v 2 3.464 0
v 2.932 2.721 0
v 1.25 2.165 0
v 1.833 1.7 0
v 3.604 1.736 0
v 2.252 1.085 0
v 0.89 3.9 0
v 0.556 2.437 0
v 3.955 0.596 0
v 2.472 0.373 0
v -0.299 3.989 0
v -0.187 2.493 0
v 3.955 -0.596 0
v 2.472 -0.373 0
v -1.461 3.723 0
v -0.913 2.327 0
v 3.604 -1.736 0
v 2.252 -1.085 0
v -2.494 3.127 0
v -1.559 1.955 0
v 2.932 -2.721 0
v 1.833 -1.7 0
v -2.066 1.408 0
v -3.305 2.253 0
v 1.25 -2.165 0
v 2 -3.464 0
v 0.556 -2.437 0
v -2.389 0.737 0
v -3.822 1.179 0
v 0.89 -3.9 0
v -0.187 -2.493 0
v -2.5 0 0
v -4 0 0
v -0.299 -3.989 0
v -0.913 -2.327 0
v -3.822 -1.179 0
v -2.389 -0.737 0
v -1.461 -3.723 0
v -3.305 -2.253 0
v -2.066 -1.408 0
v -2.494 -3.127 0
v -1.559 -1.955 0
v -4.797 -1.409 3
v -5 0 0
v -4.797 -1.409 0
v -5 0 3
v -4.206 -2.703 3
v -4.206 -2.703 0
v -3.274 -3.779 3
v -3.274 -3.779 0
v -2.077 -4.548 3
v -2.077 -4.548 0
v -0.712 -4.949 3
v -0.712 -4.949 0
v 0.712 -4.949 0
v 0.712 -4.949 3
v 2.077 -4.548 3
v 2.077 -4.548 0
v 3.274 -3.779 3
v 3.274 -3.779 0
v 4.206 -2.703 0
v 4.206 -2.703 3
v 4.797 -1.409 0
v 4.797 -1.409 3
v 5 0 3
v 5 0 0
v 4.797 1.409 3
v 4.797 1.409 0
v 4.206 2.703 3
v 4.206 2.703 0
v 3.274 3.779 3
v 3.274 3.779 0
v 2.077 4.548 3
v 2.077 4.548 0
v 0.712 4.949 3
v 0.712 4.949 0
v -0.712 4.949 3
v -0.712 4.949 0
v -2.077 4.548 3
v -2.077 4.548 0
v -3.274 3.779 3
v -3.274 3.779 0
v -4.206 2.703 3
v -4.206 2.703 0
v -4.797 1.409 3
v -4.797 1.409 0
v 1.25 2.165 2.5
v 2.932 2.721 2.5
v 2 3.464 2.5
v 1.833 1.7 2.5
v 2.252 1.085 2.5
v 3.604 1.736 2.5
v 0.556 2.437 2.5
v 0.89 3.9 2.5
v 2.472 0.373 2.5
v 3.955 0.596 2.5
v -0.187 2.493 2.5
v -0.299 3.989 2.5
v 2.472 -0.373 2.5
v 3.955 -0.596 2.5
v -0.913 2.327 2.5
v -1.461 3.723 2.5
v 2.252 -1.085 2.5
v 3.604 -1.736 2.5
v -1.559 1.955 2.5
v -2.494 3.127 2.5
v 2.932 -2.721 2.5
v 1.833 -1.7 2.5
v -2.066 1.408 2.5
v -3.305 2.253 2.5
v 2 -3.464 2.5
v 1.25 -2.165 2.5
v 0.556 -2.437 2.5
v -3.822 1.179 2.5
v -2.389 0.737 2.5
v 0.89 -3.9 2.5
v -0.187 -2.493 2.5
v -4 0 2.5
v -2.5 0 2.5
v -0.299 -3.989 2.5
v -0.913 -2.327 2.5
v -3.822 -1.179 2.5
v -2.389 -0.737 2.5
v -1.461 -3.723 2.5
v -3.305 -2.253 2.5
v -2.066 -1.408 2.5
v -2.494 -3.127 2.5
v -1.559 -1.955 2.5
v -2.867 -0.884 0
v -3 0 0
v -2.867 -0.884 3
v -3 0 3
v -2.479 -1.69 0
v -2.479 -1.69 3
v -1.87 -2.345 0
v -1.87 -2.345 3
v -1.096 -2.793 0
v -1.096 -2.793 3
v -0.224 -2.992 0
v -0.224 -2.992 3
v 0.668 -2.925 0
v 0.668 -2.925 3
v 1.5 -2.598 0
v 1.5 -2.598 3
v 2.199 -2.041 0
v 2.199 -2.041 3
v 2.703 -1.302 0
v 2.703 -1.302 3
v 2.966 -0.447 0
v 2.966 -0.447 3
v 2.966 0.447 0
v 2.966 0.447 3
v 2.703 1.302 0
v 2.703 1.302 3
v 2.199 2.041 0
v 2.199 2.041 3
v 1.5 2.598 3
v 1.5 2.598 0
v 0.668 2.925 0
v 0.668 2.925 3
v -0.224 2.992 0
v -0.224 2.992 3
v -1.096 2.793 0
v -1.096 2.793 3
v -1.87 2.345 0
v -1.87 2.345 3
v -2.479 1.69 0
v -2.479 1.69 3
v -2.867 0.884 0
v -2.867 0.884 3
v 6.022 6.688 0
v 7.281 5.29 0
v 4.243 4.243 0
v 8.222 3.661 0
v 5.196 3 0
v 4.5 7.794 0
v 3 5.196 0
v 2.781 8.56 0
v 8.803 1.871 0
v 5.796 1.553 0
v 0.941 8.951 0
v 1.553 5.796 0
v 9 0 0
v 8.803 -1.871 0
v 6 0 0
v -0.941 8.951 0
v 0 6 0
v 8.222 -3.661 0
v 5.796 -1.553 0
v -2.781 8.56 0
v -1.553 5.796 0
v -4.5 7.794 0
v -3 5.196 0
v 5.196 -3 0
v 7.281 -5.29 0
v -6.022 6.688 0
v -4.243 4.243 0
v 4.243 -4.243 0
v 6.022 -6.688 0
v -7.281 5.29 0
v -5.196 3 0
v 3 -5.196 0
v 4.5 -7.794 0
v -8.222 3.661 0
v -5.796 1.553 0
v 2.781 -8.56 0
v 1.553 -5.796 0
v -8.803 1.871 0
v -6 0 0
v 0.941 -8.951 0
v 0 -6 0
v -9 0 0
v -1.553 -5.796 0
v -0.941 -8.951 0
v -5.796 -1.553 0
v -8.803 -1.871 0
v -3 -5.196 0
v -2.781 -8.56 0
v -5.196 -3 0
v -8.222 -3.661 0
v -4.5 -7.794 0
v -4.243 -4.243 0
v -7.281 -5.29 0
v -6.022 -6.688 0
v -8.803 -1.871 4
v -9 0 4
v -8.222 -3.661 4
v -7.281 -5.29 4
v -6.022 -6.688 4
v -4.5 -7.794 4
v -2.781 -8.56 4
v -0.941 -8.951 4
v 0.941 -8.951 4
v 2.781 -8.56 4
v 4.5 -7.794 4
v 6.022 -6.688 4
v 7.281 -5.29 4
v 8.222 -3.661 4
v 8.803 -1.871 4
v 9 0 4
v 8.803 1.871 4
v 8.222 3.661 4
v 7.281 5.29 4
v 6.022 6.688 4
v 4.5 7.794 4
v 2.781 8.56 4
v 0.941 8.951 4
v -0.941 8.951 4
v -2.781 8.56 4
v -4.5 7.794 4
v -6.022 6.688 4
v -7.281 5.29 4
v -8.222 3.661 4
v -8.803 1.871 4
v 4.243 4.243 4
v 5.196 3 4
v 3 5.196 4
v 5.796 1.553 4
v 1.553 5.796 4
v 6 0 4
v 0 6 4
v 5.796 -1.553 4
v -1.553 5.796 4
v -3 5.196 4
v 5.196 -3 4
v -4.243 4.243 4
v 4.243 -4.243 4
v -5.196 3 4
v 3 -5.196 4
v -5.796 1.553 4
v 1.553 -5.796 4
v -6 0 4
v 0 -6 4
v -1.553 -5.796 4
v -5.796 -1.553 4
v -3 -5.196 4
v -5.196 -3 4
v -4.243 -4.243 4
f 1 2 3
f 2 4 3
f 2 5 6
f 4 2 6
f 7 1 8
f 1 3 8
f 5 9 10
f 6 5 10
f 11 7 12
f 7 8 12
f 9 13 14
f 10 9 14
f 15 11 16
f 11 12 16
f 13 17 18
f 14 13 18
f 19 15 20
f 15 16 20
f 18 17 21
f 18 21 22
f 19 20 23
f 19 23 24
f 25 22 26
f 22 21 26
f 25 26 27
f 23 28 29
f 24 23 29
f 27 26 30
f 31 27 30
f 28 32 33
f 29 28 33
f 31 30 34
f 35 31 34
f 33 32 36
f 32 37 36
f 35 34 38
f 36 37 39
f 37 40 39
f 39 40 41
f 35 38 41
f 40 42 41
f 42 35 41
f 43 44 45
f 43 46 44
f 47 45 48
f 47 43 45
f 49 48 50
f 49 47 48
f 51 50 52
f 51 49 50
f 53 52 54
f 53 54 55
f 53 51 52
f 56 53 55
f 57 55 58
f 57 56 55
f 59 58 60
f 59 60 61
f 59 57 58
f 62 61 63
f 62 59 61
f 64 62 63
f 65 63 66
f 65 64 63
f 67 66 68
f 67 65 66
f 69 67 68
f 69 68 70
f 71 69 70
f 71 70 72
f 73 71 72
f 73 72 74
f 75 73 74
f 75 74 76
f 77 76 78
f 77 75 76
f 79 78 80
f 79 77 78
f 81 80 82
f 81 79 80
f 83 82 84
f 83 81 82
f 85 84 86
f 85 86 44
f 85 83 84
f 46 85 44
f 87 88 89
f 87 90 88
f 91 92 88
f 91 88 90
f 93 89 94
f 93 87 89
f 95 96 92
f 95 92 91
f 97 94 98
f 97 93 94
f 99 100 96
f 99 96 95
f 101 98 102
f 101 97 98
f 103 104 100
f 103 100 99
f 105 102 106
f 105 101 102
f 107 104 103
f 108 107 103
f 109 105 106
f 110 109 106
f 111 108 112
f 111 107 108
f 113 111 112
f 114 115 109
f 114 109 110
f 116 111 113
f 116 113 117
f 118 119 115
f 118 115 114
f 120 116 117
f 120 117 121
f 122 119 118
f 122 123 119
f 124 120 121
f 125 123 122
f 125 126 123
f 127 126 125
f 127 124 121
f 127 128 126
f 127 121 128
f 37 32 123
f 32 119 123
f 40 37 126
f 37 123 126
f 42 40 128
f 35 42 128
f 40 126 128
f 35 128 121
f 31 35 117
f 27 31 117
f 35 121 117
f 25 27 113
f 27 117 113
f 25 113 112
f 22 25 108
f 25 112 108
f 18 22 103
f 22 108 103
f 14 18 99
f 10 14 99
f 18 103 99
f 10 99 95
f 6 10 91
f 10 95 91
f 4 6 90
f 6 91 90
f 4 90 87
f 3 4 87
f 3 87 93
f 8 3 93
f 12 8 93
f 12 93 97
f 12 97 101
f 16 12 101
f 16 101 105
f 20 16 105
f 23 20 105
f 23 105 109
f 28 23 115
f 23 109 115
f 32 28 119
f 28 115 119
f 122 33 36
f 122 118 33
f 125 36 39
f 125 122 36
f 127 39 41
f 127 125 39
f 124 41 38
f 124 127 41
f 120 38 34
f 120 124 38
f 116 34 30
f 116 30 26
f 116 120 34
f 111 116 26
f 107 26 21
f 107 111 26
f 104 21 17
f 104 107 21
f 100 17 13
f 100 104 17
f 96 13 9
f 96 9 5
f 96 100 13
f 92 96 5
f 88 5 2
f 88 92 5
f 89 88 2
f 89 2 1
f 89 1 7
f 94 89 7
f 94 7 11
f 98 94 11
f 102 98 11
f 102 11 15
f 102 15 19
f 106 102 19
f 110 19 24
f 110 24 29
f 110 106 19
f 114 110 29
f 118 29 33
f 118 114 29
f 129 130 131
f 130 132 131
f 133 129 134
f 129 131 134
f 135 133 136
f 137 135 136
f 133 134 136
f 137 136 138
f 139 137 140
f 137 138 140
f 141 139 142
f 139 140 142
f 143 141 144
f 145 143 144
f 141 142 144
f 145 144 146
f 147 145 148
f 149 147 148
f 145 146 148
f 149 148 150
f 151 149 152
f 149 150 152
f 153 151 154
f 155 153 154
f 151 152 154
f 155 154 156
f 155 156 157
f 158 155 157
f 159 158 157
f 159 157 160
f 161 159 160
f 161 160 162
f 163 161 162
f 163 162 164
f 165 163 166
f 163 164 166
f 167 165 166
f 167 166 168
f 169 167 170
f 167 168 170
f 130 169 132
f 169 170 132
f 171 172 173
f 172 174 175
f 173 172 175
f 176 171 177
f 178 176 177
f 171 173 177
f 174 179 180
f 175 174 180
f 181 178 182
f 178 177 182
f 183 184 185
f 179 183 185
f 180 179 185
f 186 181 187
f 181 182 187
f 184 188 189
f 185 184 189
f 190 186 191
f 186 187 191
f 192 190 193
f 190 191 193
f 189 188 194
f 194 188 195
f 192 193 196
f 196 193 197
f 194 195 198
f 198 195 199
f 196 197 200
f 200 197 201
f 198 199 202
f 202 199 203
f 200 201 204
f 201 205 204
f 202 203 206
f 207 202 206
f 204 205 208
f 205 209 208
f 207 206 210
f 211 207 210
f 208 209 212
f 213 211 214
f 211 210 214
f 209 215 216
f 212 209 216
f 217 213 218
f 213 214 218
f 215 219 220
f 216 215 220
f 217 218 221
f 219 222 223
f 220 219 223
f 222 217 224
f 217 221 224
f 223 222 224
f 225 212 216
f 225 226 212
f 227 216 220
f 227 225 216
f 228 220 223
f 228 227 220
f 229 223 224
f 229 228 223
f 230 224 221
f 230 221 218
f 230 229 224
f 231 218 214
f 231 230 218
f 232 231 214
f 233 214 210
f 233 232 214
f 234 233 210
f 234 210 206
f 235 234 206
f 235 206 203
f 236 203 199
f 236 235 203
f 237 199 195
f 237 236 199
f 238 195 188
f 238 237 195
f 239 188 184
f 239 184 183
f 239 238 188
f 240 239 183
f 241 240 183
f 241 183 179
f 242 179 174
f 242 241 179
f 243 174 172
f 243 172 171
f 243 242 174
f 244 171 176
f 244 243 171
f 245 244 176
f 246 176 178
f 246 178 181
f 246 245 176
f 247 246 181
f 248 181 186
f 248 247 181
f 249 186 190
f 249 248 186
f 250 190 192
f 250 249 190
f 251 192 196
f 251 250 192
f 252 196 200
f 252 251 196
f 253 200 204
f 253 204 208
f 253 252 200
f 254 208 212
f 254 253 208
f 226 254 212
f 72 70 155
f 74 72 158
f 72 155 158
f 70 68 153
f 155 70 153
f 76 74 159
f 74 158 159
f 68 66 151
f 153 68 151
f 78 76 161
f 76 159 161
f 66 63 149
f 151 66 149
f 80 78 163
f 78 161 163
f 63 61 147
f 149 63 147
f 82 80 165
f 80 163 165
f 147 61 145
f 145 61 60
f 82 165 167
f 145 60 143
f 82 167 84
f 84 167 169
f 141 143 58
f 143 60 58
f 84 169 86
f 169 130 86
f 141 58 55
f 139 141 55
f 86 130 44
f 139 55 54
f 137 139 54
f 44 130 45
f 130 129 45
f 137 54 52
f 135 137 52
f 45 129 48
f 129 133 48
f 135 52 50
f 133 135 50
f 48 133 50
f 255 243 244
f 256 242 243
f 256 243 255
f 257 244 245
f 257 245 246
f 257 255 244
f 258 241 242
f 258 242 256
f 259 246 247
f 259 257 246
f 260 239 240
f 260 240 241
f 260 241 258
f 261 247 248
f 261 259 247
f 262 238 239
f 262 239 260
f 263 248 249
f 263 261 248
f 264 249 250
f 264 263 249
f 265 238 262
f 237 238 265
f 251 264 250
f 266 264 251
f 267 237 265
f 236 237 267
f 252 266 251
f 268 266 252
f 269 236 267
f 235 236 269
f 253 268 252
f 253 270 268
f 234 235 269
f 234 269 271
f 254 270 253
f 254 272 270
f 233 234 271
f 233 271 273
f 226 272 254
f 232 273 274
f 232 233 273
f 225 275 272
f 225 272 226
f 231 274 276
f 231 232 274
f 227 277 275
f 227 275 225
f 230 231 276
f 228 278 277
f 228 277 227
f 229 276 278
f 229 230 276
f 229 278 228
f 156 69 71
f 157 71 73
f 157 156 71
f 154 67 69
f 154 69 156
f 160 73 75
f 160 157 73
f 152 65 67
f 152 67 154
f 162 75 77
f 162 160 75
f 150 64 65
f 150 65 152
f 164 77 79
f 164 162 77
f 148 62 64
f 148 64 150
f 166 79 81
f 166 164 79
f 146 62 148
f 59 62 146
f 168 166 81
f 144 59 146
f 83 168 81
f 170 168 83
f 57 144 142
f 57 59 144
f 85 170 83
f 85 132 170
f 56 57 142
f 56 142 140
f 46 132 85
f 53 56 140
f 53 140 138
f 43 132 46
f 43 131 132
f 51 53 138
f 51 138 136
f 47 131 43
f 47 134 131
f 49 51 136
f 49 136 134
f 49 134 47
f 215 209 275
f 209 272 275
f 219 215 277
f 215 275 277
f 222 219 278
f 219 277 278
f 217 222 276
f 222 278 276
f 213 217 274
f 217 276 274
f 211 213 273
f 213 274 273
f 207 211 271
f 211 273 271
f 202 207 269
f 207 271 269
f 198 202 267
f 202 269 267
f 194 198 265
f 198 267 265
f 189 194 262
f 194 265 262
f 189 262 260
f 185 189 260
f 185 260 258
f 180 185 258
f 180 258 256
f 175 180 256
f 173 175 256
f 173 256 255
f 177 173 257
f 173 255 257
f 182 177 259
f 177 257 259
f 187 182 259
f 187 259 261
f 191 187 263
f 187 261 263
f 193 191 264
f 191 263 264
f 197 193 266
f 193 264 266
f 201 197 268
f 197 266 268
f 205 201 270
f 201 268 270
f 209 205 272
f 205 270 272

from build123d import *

# Parameters (mm, degrees)
F0_W = 1.5
F0_H = 2.5
F2_W = 3
F2_H = 4
F4_W = 2
F4_H = 3


with BuildPart() as f1:
    # F0 (on Front) → F1 (revolve)
    with BuildSketch(Plane.XZ):
        with Locations((-3.25, 1.25)):
            Rectangle(F0_W, F0_H)
    revolve(axis=Axis((0, 0, 1.726017), (0, 0, 1)))


with BuildPart() as f3:
    # F2 (on Front) → F3 (revolve)
    with BuildSketch(Plane.XZ):
        with Locations((-7.5, 2)):
            Rectangle(F2_W, F2_H)
    revolve(axis=Axis((0, 0, 3.215874), (0, 0, 1)))


with BuildPart() as f5:
    # F4 (on Front) → F5 (revolve)
    with BuildSketch(Plane.XZ):
        with Locations((-4, 1.5)):
            Rectangle(F4_W, F4_H)
    revolve(axis=Axis((0, 0, 1.631281), (0, 0, 1)))


solid = Compound([f1.part, f3.part, f5.part])
